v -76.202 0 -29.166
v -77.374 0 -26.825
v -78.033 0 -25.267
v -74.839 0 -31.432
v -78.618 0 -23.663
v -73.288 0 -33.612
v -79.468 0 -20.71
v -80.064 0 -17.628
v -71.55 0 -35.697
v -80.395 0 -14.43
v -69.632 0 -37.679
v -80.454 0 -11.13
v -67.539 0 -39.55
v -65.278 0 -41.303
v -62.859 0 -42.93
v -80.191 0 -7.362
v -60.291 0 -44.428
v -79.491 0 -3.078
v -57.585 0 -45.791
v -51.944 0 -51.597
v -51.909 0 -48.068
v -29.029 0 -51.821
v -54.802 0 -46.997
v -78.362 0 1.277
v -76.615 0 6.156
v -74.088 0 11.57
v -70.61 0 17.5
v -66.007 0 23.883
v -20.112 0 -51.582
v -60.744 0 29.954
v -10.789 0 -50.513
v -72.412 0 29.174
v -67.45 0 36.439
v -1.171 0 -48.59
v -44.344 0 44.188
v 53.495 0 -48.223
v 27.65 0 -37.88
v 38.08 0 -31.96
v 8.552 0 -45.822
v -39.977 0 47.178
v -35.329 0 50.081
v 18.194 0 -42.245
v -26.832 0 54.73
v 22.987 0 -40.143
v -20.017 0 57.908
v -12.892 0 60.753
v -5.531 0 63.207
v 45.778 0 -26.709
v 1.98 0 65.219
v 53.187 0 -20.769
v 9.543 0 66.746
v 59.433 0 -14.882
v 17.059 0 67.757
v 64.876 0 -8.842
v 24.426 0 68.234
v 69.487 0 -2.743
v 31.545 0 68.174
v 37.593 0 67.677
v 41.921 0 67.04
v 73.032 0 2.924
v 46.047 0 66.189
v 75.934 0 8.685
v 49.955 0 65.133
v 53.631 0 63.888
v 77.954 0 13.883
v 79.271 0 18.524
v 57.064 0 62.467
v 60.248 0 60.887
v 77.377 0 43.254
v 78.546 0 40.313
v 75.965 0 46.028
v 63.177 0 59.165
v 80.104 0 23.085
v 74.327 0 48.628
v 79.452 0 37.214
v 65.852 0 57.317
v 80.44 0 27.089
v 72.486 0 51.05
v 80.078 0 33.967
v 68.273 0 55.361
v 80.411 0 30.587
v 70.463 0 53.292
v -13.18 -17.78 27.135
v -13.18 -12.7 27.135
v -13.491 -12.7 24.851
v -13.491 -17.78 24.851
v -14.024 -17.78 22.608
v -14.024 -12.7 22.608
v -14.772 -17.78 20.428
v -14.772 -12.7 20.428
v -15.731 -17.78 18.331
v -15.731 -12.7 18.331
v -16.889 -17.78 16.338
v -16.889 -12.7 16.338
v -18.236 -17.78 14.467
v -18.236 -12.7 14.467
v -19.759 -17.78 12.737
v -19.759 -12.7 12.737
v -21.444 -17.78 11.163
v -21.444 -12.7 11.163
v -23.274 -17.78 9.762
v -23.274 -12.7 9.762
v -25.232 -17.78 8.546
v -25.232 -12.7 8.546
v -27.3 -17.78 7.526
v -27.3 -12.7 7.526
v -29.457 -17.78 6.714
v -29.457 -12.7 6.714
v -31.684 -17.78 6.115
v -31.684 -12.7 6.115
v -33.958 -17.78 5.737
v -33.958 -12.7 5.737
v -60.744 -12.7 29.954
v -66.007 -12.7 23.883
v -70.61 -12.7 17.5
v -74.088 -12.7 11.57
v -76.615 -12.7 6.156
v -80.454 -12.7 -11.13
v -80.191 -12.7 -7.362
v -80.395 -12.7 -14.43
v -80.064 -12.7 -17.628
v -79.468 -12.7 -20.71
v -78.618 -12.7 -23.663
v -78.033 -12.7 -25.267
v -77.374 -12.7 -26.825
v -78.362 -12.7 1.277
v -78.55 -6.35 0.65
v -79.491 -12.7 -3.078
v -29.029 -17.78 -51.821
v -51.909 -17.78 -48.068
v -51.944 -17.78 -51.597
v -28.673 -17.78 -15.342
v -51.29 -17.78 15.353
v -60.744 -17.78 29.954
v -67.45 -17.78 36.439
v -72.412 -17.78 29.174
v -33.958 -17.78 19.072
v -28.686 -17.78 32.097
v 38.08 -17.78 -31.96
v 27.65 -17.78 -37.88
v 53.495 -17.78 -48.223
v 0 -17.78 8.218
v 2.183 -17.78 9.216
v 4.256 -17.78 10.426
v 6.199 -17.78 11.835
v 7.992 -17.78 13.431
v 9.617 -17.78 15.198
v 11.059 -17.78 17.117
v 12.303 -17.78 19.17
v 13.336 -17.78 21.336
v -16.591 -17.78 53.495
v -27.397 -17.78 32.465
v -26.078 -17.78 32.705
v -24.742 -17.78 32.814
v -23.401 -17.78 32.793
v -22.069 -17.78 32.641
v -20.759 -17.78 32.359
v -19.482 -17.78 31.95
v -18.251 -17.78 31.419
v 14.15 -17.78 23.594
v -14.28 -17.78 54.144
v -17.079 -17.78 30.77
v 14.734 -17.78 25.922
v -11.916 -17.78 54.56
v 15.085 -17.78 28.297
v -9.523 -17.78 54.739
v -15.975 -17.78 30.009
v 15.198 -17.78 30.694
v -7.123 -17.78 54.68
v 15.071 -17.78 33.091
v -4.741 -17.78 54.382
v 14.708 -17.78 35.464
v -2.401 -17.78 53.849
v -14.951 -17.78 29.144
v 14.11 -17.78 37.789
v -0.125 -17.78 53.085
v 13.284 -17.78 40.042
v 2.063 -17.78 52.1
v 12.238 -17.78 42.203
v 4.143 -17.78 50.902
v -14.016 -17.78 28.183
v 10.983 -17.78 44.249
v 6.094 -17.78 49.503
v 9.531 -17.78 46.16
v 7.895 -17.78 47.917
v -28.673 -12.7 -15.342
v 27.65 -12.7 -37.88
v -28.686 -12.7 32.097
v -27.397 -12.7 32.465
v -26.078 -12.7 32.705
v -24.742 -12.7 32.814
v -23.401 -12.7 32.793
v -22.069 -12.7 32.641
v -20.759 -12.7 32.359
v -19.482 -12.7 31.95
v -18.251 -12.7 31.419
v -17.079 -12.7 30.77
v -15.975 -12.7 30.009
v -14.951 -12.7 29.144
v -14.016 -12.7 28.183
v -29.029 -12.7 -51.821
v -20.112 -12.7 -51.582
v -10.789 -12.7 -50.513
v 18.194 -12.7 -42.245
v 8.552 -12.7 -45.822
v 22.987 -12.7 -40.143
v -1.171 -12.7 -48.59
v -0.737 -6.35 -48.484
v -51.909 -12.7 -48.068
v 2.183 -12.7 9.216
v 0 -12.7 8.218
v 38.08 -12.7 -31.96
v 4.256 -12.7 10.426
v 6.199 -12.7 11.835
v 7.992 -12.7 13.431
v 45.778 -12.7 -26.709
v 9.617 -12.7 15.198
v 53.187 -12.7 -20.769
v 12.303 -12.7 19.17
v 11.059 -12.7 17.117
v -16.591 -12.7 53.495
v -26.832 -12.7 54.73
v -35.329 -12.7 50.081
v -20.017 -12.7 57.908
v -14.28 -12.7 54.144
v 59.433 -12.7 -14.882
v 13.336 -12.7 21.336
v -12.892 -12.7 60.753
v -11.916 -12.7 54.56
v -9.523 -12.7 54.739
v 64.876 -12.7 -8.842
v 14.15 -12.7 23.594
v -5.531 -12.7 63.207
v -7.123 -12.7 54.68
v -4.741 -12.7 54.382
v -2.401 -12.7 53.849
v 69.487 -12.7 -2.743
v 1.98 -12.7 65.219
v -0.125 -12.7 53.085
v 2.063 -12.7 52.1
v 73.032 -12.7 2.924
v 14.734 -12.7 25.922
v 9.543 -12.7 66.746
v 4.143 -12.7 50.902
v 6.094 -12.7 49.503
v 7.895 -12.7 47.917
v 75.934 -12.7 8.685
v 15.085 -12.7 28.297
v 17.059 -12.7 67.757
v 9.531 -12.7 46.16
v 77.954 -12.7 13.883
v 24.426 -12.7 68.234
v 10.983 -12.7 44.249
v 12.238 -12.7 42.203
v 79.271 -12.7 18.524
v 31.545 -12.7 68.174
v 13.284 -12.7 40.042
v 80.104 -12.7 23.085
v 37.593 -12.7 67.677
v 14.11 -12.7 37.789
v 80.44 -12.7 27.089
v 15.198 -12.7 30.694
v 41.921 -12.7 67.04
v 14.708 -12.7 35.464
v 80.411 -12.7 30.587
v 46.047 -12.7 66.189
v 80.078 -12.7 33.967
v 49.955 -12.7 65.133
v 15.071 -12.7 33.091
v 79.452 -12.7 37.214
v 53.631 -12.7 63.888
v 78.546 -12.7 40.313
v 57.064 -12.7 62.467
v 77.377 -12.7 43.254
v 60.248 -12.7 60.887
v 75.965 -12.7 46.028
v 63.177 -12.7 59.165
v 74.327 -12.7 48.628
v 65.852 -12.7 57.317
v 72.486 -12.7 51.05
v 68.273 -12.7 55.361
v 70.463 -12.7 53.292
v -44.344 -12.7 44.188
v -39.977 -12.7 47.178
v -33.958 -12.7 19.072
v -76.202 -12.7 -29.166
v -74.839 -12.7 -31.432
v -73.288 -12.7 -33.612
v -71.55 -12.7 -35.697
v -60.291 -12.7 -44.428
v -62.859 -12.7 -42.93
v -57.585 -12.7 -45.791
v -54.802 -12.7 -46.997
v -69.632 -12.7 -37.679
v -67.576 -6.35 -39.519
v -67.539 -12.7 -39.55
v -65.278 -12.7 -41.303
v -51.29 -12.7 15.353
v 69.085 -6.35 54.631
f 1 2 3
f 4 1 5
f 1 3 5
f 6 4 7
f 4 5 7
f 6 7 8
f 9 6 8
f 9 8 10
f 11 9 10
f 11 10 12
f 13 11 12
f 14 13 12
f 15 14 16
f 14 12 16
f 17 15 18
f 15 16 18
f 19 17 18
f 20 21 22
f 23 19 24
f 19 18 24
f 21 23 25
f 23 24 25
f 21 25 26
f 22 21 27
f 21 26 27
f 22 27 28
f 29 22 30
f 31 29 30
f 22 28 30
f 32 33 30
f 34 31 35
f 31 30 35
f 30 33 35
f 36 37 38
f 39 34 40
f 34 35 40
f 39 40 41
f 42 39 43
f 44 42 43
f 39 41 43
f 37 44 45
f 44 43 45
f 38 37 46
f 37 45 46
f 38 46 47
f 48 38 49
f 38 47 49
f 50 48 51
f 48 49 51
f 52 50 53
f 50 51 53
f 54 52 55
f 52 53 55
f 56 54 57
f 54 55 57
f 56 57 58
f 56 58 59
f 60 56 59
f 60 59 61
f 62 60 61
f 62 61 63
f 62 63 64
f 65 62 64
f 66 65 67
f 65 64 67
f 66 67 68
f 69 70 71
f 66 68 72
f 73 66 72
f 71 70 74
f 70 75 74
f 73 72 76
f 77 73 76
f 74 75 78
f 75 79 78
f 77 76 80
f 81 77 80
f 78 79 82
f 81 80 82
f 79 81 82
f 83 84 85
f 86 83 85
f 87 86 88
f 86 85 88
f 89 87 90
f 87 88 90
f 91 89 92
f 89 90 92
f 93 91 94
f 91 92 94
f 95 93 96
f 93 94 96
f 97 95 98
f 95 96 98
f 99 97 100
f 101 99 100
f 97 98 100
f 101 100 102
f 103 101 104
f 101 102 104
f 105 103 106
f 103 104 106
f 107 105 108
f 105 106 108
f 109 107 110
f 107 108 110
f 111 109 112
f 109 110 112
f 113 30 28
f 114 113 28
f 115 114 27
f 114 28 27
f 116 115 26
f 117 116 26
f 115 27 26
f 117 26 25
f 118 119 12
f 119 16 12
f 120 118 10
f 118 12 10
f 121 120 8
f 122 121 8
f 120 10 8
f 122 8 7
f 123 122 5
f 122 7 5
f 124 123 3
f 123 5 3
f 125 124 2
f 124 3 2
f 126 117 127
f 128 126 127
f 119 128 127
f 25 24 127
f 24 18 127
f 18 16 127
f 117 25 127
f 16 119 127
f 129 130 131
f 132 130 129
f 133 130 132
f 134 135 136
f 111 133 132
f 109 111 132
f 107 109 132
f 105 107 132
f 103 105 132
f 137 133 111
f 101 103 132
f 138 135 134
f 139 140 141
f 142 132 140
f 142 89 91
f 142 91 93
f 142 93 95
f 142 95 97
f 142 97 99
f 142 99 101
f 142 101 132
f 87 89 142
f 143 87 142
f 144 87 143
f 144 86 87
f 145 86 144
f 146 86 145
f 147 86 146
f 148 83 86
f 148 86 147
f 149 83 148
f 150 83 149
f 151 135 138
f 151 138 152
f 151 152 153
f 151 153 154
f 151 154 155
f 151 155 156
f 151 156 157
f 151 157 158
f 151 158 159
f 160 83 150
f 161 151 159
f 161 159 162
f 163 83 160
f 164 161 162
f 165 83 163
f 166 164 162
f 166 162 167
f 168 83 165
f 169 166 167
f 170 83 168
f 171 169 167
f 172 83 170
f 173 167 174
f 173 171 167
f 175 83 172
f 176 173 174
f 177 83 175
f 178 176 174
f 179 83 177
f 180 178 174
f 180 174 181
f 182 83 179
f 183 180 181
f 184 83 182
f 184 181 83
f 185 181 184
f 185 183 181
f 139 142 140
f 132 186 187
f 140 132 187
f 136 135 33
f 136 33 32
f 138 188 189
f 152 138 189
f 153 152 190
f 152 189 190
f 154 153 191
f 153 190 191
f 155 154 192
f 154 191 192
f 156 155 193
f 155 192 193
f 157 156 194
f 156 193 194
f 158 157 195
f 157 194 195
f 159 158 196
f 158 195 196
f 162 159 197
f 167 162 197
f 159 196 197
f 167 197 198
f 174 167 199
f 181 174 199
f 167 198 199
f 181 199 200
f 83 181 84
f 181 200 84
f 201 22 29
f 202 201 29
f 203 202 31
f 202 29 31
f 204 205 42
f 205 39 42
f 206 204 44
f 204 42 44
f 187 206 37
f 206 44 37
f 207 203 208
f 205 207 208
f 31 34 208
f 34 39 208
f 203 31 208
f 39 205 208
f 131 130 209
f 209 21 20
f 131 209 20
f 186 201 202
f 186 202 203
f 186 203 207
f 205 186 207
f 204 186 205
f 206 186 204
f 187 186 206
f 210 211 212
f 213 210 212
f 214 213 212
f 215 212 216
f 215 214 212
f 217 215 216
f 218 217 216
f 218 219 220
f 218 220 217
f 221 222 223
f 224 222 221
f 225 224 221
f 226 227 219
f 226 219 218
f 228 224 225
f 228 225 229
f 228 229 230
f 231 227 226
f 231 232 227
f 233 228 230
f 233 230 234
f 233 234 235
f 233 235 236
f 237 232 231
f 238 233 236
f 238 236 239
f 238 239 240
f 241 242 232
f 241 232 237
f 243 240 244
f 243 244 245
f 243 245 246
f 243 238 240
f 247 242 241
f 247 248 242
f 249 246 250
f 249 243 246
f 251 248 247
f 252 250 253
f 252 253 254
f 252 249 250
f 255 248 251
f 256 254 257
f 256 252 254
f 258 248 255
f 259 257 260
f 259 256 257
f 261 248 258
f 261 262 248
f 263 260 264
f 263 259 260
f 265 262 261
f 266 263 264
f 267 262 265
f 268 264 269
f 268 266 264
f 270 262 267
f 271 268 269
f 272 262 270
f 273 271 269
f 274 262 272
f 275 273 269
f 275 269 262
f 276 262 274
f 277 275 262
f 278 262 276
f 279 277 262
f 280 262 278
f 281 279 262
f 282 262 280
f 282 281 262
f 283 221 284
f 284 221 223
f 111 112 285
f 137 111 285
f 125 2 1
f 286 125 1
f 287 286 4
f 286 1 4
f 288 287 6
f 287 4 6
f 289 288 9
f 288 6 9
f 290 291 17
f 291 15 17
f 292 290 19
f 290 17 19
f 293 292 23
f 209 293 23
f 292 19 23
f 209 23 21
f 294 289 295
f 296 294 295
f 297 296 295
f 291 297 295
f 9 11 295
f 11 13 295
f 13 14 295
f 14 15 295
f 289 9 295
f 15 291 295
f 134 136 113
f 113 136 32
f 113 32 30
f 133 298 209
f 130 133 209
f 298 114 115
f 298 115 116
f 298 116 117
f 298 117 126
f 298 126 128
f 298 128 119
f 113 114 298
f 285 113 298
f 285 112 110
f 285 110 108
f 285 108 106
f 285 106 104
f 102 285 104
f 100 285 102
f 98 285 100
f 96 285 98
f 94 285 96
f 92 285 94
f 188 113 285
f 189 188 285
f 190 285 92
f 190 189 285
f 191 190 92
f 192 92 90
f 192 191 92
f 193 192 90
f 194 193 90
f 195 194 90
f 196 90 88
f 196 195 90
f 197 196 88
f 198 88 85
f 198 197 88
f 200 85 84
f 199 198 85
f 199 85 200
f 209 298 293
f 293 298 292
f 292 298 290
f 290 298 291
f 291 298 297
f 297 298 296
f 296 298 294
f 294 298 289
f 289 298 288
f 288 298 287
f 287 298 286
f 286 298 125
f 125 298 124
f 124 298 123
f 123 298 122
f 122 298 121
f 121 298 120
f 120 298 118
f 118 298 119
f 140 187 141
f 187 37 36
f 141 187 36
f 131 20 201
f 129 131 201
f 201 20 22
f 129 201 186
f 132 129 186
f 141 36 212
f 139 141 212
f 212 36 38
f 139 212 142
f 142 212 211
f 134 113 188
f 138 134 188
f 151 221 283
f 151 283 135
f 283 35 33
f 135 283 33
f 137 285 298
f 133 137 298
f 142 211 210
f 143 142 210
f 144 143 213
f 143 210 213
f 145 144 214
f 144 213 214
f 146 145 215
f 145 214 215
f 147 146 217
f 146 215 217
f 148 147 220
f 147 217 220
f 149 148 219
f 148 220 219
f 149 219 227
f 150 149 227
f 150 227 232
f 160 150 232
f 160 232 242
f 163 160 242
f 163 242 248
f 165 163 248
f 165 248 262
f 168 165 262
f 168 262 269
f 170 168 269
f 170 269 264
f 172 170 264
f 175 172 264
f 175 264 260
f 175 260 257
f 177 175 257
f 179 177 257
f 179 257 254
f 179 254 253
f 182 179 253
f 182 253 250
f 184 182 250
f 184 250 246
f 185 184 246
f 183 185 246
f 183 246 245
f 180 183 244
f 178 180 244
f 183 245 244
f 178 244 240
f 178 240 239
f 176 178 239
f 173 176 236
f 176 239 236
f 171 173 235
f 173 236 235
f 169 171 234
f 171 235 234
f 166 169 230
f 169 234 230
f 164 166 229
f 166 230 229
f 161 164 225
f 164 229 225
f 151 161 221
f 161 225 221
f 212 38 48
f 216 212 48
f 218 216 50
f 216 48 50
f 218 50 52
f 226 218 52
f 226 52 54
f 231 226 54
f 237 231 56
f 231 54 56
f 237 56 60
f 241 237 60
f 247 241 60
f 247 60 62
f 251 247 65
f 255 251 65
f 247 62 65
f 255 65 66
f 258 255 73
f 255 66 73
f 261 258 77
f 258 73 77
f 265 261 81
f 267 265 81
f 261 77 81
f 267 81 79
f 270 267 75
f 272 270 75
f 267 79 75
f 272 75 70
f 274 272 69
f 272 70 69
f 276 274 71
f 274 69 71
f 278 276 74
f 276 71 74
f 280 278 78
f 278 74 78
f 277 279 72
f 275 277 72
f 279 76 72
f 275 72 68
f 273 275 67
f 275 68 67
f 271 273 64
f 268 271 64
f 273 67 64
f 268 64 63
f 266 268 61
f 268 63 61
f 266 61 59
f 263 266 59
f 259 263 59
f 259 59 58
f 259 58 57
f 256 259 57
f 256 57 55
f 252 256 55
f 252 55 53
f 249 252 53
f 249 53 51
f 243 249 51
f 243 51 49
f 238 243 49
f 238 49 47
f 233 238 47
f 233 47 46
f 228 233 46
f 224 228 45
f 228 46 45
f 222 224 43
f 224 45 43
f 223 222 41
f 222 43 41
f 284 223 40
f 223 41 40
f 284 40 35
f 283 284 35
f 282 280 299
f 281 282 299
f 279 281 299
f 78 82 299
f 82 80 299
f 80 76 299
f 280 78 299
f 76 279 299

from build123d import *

# Parameters (mm, degrees)
F1_DEPTH = 17.78
F2_DEPTH = 12.7


with BuildPart() as f1:
    # F0 (on Front) → F1 (new body)
    with BuildSketch(Plane.XZ):
        with BuildLine():
            Line((-51.2901654862, 15.3534509714), (-51.9092994403, -48.0677951135))
            add(Edge.make_bspline(
                [(-51.9092994403, -48.0677951135), (-41.6057778166, -51.5776260761), (-29.0291292521, -51.8205253444)],
                knots=[0.5915359524, 0.5915359524, 0.5915359524, 0.9236195546, 0.9236195546, 0.9236195546], degree=2, weights=[1, 0.9862467018, 1]))
            Line((-29.0291292521, -51.8205253444), (-28.6730148599, -15.3417983256))
            Line((-28.6730148599, -15.3417983256), (27.6495488689, -37.8804578513))
            add(Edge.make_bspline(
                [(27.6495488689, -37.8804578513), (33.0317177029, -35.138839342), (38.080437783, -31.9595411631)],
                knots=[1.6434779546, 1.6434779546, 1.6434779546, 1.7856879064, 1.7856879064, 1.7856879064], degree=2, weights=[1, 0.9974731061, 1]))
            Line((38.080437783, -31.9595411631), (0, 8.218081668))
            ThreePointArc((0, 8.218081668), (13.7250963904, 38.9258024925), (-16.5912210941, 53.4950606525))
            Line((-16.5912210941, 53.4950606525), (-44.3439349242, 44.1877468728))
            add(Edge.make_bspline(
                [(-44.3439349242, 44.1877468728), (-53.5267323563, 37.6104182577), (-60.7439466231, 29.953758261)],
                knots=[5.017975378, 5.017975378, 5.017975378, 5.2898153889, 5.2898153889, 5.2898153889], degree=2, weights=[1, 0.990777088, 1]))
            Line((-60.7439466231, 29.953758261), (-28.6857560277, 32.0970378816))
            ThreePointArc((-28.6857560277, 32.0970378816), (-20.1155001777, 32.1703219773), (-13.1799420342, 27.1351765841))
            ThreePointArc((-13.1799420342, 27.1351765841), (-19.7589661895, 12.7367227479), (-33.957734704, 5.7371510193))
            Line((-33.957734704, 5.7371510193), (-33.957734704, 19.0721508116))
            Line((-33.957734704, 19.0721508116), (-51.2901654862, 15.3534509714))
        make_face()
        with BuildLine():
            Line((-72.4121555686, 29.1736694918), (-60.7439466231, 29.953758261))
            add(Edge.make_bspline(
                [(-44.3439349242, 44.1877468728), (-53.5267323563, 37.6104182577), (-60.7439466231, 29.953758261)],
                knots=[5.017975378, 5.017975378, 5.017975378, 5.2898153889, 5.2898153889, 5.2898153889], degree=2, weights=[1, 0.990777088, 1]))
            Line((-44.3439349242, 44.1877468728), (-67.4502924085, 36.4386625588))
            Line((-67.4502924085, 36.4386625588), (-72.4121555686, 29.1736694918))
        make_face()
        with BuildLine():
            add(Edge.make_bspline(
                [(27.6495488689, -37.8804578513), (33.0317177029, -35.138839342), (38.080437783, -31.9595411631)],
                knots=[1.6434779546, 1.6434779546, 1.6434779546, 1.7856879064, 1.7856879064, 1.7856879064], degree=2, weights=[1, 0.9974731061, 1]))
            Line((27.6495488689, -37.8804578513), (53.4950569272, -48.2230819762))
            Line((53.4950569272, -48.2230819762), (38.080437783, -31.9595411631))
        make_face()
        with BuildLine():
            add(Edge.make_bspline(
                [(-51.9092994403, -48.0677951135), (-41.6057778166, -51.5776260761), (-29.0291292521, -51.8205253444)],
                knots=[0.5915359524, 0.5915359524, 0.5915359524, 0.9236195546, 0.9236195546, 0.9236195546], degree=2, weights=[1, 0.9862467018, 1]))
            Line((-51.9092994403, -48.0677951135), (-51.9437507272, -51.596827119))
            Line((-51.9437507272, -51.596827119), (-29.0291292521, -51.8205253444))
        make_face()
    extrude(amount=F1_DEPTH)

    # F0 (on Front) → F2 (join)
    with BuildSketch(Plane.XZ):
        with BuildLine():
            add(Edge.make_bspline(
                [(-60.7439466231, 29.953758261), (-89.3464589617, -0.3903196527), (-77.3740112782, -26.8250592053)],
                knots=[5.2898153889, 5.2898153889, 5.2898153889, 6.2831853072, 6.2831853072, 6.2831853072], degree=2, weights=[1, 0.8791670521, 1]))
            add(Edge.make_bspline(
                [(-77.3740112782, -26.8250592053), (-70.6433306393, -41.6861631668), (-51.9092994403, -48.0677951135)],
                knots=[0, 0, 0, 0.5915359524, 0.5915359524, 0.5915359524], degree=2, weights=[1, 0.9565785789, 1]))
            Line((-51.9092994403, -48.0677951135), (-51.2901654862, 15.3534509714))
            Line((-51.2901654862, 15.3534509714), (-33.957734704, 19.0721508116))
            Line((-33.957734704, 19.0721508116), (-33.957734704, 5.7371510193))
            ThreePointArc((-33.957734704, 5.7371510193), (-19.7589661895, 12.7367227479), (-13.1799420342, 27.1351765841))
            ThreePointArc((-13.1799420342, 27.1351765841), (-20.1155001777, 32.1703219773), (-28.6857560277, 32.0970378816))
            Line((-28.6857560277, 32.0970378816), (-60.7439466231, 29.953758261))
        make_face()
        with BuildLine():
            Line((-28.6730148599, -15.3417983256), (-29.0291292521, -51.8205253444))
            add(Edge.make_bspline(
                [(-29.0291292521, -51.8205253444), (-0.7874770817, -52.3659708668), (27.6495488689, -37.8804578513)],
                knots=[0.9236195546, 0.9236195546, 0.9236195546, 1.6434779546, 1.6434779546, 1.6434779546], degree=2, weights=[1, 0.9359217623, 1]))
            Line((27.6495488689, -37.8804578513), (-28.6730148599, -15.3417983256))
        make_face()
        with BuildLine():
            add(Edge.make_bspline(
                [(38.080437783, -31.9595411631), (112.2540445937, 14.7493294642), (69.0849212114, 54.6308786285), (25.9157978291, 94.5124277927), (-44.3439349242, 44.1877468728)],
                knots=[1.7856879064, 1.7856879064, 1.7856879064, 3.4018316422, 3.4018316422, 5.017975378, 5.017975378, 5.017975378], degree=2, weights=[1, 0.6908936718, 1, 0.6908936718, 1]))
            Line((-44.3439349242, 44.1877468728), (-16.5912210941, 53.4950606525))
            ThreePointArc((-16.5912210941, 53.4950606525), (13.7250963904, 38.9258024925), (0, 8.218081668))
            Line((0, 8.218081668), (38.080437783, -31.9595411631))
        make_face()
    extrude(amount=F2_DEPTH)


solid = f1.part
